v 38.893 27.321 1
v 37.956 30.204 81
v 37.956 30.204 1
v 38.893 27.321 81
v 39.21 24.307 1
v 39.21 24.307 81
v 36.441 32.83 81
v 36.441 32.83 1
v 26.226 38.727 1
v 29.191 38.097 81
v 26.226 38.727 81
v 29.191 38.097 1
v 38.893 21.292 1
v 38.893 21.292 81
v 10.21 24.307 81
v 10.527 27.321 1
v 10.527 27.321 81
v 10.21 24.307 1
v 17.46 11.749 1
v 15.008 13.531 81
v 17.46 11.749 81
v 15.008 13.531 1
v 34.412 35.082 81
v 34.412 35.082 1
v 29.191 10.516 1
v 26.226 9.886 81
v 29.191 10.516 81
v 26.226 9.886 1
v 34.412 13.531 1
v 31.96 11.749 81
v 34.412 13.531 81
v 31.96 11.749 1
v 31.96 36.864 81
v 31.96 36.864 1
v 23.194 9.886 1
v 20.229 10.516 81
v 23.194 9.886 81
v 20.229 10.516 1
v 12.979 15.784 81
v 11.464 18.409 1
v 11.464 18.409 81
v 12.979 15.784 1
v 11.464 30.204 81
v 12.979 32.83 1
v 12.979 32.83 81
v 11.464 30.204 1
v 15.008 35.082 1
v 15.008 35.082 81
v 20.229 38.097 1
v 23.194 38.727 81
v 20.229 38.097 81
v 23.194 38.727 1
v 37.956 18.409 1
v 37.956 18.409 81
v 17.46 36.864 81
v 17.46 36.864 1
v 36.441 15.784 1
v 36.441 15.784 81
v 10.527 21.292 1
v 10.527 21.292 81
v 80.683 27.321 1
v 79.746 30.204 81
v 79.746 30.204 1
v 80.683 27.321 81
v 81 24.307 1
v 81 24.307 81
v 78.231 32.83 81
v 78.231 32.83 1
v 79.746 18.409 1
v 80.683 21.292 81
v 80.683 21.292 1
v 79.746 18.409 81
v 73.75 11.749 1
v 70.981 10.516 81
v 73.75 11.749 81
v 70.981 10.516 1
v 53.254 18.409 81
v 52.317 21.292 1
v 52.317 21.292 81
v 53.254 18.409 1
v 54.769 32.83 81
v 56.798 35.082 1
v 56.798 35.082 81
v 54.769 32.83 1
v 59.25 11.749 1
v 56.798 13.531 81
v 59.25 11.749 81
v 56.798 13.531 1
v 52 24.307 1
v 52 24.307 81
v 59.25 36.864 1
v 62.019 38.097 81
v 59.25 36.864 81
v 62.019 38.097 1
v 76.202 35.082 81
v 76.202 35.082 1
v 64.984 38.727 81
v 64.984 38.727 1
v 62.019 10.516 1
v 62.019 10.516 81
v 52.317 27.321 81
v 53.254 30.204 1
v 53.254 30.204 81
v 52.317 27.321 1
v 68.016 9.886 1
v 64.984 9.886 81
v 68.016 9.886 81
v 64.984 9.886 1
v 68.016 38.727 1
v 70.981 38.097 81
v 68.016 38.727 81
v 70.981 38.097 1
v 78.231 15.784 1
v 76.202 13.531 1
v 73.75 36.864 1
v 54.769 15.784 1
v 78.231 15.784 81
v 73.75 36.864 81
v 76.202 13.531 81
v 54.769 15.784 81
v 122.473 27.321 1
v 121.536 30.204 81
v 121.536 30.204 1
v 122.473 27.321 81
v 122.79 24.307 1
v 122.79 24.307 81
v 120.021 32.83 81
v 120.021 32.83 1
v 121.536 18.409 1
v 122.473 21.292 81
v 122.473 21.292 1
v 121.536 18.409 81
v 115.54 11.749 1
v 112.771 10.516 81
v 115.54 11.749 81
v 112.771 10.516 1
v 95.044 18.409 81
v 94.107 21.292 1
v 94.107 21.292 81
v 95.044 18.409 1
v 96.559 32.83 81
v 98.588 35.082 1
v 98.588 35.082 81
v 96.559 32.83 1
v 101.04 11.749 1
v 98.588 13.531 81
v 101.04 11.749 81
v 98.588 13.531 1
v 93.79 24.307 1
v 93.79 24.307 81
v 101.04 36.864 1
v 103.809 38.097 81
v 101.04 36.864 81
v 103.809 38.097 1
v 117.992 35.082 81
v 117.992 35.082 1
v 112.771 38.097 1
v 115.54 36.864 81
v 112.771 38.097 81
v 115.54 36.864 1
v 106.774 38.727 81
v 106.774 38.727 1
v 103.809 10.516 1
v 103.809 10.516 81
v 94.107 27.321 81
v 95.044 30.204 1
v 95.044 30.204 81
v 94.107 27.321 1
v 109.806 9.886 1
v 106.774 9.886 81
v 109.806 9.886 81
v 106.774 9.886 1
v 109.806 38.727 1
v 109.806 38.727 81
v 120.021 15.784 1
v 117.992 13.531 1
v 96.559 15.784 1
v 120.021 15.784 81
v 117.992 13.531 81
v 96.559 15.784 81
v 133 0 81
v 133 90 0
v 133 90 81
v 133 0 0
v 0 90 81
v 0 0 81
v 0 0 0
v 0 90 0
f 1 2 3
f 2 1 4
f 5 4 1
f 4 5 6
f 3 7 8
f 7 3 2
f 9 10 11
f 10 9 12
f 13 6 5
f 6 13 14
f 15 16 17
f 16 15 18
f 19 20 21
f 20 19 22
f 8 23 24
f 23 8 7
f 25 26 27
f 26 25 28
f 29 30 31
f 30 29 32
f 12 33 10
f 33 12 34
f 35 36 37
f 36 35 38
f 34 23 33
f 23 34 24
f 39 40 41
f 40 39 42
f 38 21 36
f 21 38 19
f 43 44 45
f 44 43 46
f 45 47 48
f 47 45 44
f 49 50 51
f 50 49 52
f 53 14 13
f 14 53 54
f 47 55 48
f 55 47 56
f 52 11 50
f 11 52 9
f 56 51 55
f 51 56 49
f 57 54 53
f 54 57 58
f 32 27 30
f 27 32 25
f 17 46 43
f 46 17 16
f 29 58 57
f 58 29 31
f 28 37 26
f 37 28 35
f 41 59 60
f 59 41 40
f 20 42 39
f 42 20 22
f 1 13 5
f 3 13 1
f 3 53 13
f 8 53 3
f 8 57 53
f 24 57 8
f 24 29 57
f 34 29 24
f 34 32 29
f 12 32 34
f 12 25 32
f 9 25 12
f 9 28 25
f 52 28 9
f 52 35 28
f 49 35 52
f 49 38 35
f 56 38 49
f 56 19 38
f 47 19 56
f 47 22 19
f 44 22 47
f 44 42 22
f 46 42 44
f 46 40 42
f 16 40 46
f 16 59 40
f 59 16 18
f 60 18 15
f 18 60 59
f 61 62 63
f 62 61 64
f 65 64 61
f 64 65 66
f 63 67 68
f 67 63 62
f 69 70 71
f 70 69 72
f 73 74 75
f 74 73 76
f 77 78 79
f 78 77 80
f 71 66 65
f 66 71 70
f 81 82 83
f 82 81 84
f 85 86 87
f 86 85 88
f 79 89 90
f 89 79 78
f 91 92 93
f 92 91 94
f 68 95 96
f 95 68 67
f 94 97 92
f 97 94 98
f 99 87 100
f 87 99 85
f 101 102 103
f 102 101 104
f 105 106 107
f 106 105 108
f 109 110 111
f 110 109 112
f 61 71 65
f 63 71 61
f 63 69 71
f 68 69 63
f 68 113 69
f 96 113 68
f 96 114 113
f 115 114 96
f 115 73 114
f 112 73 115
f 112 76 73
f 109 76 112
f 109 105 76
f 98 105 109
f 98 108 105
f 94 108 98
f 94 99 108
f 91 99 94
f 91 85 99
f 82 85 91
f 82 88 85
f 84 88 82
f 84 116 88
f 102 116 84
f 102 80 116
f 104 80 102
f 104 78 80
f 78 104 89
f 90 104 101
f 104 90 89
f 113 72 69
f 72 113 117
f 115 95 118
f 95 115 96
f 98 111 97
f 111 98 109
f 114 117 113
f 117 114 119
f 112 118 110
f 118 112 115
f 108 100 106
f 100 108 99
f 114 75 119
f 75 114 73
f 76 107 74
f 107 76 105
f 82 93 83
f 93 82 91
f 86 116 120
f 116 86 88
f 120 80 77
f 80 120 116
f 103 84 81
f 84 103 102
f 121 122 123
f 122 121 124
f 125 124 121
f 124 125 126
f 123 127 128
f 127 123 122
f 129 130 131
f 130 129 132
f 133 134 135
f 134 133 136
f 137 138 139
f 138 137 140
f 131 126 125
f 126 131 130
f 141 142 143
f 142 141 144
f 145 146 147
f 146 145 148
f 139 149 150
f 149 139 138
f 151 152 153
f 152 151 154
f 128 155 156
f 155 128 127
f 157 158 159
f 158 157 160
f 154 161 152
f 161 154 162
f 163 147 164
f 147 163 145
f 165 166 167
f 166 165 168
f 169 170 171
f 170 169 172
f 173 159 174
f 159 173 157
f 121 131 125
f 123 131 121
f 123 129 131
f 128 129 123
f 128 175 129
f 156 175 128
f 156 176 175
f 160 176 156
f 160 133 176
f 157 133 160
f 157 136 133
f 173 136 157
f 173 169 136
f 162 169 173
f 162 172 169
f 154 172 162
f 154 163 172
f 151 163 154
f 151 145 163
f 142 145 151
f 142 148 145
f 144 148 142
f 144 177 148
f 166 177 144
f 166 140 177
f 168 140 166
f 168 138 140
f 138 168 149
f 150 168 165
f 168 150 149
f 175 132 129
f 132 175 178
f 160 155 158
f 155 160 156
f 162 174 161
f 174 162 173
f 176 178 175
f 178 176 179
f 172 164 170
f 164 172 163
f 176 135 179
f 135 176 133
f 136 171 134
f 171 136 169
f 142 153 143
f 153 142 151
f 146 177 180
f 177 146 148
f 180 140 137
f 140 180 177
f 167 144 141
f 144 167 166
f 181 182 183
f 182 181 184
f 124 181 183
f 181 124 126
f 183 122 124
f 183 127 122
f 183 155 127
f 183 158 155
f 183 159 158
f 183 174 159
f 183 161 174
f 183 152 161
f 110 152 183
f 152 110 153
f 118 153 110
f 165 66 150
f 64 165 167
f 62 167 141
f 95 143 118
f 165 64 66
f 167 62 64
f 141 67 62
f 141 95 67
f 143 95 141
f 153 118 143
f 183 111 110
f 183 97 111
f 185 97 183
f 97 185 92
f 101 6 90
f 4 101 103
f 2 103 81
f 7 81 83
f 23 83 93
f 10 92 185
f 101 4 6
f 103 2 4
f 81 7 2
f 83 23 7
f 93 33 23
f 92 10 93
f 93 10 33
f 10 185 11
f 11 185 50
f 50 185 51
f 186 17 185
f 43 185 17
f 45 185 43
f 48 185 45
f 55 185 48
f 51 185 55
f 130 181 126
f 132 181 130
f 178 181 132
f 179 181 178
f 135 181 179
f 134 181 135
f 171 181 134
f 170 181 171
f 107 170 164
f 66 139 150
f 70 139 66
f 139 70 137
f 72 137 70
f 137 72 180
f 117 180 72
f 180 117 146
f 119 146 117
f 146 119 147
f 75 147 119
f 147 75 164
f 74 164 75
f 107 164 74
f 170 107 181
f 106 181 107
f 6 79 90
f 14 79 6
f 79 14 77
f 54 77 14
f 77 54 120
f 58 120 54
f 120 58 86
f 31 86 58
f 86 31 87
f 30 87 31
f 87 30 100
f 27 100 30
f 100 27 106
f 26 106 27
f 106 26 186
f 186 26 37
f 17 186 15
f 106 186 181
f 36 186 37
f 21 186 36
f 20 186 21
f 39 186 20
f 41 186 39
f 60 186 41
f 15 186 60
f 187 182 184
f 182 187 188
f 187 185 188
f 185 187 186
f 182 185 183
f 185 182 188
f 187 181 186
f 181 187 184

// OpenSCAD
// [FL_INDEX: keywords="openscad, 3d_parametric, Centrifuge_rack, csg_solid" | COT="Parametric OpenSCAD design from 3DCodeverse"]
// Title: Centrifuge rack

//Shape of Tube
_shape = 1; //[1:Cylinder,2:Square,3:Pentagon,4:Hexagon,5:Heptagon,6:Octagon]

/*
//Type of Tube
tube_type = 1; //[1:50mL Falcon, 2:15mL Corning, 3:5mL Culture Tube, 4:Other]
*/

// Tube Diameter, 
_diameter = 29;

// Cap Diameter,
cap_diameter = 34.16; 

// Thickness of the base under the tubes
_base = 1;

// Height of rack, plus thickness of base
_height = 80 + _base;

// Length of rack
_length = 133;

// Width of rack
_width = 90;

// Number of tube across
_columns = 3;

// Number of tubes deep
_rows = 2;






module tube(shape, diameter, height)
{
	if(shape == 1)
	{
		cylinder(height, diameter/2, diameter/2);
	}
	if(shape == 2)
	{
		cube([diameter,diameter,height]);
	}
	if(shape == 3)
	{
		linear_extrude(height) circle(diameter/2,$fn=5);
	}
	if(shape == 4)
	{
		linear_extrude(height) circle(diameter/2,$fn=6);
	}
	if(shape == 5)
	{
		linear_extrude(height) circle(diameter/2,$fn=7);
	}
	if(shape == 6)
	{
		linear_extrude(height) circle(diameter/2,$fn=8);
	}
}

module tubeColumn(shape, diameter, height, columns, length, capDiameter)
{
	spacing = (length - (capDiameter*columns)) / (columns + 1);
	for ( x = [spacing + capDiameter/2 : capDiameter + spacing : spacing*columns + capDiameter*(columns - 1) + capDiameter/2])
	{
		translate([x,0,0])tube(shape, diameter, height);
	}
}

module tubeArray(shape, diameter, height, rows, width, columns, length, capDiameter)
{
	spacing = (width - (capDiameter*rows)) / (rows + 1);
	for ( y = [spacing + capDiameter/2 : capDiameter + spacing : spacing*rows + capDiameter*(rows - 1) + capDiameter/2])
	{
		translate([0,y,0])tubeColumn(shape, diameter, height, columns, length, capDiameter);
	}
}

module base(height, length, width)
{
	cube([length, width, height]);
}


difference() 
{
	base(_height,_length,_width);
	translate([0,0,_base])tubeArray(_shape,_diameter,_height,_rows,_width,_columns,_length,cap_diameter);
}
